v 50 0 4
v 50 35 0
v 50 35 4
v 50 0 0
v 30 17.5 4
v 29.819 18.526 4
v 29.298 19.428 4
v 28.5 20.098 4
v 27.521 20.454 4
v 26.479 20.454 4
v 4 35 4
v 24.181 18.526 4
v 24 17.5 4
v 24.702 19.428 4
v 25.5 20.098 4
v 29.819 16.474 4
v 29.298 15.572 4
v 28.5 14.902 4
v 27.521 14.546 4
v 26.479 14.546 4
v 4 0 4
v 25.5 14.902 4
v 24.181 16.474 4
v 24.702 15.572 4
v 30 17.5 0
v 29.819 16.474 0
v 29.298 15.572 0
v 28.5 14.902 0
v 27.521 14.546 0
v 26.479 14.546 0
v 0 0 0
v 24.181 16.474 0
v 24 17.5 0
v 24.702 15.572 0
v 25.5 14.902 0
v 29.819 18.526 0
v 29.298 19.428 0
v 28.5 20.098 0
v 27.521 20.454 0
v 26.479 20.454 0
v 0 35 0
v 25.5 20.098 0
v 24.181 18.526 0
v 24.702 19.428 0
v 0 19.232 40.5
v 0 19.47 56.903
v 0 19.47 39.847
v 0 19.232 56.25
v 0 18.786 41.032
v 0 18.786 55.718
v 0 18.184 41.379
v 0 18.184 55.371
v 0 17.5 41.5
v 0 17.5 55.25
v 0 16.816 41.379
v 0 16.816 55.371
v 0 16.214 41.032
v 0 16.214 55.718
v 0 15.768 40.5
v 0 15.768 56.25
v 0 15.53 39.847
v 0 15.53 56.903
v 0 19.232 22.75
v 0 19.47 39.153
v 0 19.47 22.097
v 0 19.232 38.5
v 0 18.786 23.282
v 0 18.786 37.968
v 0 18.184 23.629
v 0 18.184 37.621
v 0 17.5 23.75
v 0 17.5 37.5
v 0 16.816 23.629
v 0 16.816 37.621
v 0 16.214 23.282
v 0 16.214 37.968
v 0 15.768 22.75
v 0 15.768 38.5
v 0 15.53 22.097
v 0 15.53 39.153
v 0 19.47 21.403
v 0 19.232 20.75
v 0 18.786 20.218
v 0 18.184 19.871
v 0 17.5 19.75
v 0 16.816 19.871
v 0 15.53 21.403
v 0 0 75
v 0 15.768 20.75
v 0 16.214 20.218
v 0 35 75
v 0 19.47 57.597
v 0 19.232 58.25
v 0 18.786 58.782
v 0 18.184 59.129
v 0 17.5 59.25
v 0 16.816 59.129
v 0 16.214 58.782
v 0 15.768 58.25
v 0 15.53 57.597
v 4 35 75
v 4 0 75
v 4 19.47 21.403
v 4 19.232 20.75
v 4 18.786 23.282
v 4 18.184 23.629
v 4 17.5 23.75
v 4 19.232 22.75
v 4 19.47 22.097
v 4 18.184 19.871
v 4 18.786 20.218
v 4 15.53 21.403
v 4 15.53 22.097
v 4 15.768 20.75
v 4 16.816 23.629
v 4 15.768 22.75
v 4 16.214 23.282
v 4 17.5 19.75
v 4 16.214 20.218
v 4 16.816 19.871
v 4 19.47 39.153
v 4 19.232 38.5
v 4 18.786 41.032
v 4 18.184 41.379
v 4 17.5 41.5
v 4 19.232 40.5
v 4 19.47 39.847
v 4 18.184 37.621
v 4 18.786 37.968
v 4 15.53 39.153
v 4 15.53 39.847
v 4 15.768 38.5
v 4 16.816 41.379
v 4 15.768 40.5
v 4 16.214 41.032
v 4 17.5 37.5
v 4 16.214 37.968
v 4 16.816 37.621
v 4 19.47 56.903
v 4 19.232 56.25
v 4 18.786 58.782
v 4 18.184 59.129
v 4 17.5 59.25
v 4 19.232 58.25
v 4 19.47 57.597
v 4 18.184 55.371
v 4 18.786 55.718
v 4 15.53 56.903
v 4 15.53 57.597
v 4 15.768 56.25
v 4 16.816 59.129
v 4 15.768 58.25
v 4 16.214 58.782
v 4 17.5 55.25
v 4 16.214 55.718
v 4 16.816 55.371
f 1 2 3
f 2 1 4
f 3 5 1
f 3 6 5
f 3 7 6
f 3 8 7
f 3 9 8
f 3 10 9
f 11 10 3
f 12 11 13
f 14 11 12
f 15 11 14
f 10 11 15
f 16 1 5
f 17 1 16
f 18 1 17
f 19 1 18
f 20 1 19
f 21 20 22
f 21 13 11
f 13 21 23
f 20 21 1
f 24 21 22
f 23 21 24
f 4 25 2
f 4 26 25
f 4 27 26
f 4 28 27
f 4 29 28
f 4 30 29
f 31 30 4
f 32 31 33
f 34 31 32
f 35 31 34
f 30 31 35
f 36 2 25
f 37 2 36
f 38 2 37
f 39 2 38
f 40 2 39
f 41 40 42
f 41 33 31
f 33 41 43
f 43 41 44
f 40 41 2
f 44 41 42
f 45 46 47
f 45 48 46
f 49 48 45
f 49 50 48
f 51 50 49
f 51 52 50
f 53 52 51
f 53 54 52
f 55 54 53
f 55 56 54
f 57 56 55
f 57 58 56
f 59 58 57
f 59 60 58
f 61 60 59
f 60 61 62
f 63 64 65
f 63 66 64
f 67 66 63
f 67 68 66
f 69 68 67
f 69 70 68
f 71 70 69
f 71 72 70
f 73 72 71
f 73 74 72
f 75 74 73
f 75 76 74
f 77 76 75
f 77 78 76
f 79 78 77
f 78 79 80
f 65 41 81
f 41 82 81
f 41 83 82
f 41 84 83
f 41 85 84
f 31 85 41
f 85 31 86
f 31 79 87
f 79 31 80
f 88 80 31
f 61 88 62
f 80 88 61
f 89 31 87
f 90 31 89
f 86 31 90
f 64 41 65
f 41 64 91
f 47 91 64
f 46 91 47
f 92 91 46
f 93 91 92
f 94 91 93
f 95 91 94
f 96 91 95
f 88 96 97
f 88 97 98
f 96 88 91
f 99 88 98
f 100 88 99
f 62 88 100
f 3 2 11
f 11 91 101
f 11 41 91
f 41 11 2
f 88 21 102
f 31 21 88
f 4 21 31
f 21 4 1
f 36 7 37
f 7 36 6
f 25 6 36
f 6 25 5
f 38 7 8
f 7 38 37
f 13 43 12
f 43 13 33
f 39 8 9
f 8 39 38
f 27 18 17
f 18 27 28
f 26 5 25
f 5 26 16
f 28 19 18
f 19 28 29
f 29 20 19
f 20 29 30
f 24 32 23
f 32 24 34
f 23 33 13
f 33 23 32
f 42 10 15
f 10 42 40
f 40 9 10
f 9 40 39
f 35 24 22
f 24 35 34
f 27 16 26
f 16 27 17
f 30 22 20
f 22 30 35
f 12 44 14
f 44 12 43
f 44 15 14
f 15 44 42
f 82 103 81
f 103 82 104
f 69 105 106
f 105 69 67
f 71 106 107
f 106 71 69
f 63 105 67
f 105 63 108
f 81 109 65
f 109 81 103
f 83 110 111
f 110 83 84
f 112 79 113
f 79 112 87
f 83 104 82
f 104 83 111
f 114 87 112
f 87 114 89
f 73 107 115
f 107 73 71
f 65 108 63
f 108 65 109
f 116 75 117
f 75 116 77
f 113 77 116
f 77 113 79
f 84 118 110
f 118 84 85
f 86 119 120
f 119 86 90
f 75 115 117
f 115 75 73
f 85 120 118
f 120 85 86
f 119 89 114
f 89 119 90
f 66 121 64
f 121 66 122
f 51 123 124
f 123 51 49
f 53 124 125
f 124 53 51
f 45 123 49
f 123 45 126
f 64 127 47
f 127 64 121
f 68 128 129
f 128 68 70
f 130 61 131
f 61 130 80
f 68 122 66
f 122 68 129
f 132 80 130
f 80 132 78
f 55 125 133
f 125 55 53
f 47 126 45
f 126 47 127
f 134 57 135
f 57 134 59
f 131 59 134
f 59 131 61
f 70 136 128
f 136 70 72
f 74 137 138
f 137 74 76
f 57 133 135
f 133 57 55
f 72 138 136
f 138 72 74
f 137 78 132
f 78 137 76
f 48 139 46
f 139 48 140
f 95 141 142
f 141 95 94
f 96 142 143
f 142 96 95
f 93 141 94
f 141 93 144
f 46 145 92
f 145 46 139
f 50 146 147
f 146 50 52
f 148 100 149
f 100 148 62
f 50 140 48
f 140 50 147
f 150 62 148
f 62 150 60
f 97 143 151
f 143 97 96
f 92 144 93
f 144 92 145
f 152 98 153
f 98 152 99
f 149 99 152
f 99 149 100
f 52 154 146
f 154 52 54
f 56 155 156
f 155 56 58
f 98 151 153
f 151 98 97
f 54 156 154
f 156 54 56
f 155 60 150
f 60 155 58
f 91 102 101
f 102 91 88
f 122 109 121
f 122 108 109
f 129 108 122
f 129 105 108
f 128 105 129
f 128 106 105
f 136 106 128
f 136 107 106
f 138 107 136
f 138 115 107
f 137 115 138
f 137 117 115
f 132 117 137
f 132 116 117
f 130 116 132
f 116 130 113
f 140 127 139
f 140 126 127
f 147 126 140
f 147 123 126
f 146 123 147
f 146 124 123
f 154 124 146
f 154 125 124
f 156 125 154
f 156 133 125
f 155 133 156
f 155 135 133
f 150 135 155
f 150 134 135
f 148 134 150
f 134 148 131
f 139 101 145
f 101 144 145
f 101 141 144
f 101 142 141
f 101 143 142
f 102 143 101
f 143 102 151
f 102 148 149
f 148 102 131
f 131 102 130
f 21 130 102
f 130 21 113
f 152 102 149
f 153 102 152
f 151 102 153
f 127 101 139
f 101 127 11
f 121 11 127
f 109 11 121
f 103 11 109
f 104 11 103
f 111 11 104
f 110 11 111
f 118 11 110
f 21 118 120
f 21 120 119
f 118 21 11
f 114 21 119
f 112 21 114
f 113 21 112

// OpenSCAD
/*
    module shelf_bracket
    
    parameters:
    - side_a    is a vector [length, hole diameter, number of holes]
    - side_b    is a vector [length, hole diameter, number of holes]
    - width     refers to the width of the bracket
    - thickness refers to the material thickness of the bracket
*/

module shelf_bracket( side_a = [50,6,1], side_b = [75,4,3], width = 35, thickness = 4 ) {
    
    module xhole_plate( size, h_dm, h_num, margin ) {
        
        difference() {
        
            cube(size);
            
            h_distance = (size.x - margin) / (h_num + 1);
            
            for (x = [1:h_num])
                translate([
                    margin + x * h_distance,
                    size.y/2,
                    -1])
                cylinder( d = h_dm, h = size.z + 2, $fn=18);
            }
        }
        
        // side A
        xhole_plate(
            [side_a[0], width, thickness],
            side_a[1],
            side_a[2],
            thickness
        );
        
        // side B
        translate([thickness,0,0])
        rotate([0,-90,0])
        xhole_plate(
            [side_b[0], width, thickness],
            side_b[1],
            side_b[2],
            thickness
        );
    }

//shelf_bracket(
//  side_a    = [50, 6, 1],
//  side_b    = [75, 4, 3],
//  width     = 35,
//  thickness = 4
//);
    
shelf_bracket();
